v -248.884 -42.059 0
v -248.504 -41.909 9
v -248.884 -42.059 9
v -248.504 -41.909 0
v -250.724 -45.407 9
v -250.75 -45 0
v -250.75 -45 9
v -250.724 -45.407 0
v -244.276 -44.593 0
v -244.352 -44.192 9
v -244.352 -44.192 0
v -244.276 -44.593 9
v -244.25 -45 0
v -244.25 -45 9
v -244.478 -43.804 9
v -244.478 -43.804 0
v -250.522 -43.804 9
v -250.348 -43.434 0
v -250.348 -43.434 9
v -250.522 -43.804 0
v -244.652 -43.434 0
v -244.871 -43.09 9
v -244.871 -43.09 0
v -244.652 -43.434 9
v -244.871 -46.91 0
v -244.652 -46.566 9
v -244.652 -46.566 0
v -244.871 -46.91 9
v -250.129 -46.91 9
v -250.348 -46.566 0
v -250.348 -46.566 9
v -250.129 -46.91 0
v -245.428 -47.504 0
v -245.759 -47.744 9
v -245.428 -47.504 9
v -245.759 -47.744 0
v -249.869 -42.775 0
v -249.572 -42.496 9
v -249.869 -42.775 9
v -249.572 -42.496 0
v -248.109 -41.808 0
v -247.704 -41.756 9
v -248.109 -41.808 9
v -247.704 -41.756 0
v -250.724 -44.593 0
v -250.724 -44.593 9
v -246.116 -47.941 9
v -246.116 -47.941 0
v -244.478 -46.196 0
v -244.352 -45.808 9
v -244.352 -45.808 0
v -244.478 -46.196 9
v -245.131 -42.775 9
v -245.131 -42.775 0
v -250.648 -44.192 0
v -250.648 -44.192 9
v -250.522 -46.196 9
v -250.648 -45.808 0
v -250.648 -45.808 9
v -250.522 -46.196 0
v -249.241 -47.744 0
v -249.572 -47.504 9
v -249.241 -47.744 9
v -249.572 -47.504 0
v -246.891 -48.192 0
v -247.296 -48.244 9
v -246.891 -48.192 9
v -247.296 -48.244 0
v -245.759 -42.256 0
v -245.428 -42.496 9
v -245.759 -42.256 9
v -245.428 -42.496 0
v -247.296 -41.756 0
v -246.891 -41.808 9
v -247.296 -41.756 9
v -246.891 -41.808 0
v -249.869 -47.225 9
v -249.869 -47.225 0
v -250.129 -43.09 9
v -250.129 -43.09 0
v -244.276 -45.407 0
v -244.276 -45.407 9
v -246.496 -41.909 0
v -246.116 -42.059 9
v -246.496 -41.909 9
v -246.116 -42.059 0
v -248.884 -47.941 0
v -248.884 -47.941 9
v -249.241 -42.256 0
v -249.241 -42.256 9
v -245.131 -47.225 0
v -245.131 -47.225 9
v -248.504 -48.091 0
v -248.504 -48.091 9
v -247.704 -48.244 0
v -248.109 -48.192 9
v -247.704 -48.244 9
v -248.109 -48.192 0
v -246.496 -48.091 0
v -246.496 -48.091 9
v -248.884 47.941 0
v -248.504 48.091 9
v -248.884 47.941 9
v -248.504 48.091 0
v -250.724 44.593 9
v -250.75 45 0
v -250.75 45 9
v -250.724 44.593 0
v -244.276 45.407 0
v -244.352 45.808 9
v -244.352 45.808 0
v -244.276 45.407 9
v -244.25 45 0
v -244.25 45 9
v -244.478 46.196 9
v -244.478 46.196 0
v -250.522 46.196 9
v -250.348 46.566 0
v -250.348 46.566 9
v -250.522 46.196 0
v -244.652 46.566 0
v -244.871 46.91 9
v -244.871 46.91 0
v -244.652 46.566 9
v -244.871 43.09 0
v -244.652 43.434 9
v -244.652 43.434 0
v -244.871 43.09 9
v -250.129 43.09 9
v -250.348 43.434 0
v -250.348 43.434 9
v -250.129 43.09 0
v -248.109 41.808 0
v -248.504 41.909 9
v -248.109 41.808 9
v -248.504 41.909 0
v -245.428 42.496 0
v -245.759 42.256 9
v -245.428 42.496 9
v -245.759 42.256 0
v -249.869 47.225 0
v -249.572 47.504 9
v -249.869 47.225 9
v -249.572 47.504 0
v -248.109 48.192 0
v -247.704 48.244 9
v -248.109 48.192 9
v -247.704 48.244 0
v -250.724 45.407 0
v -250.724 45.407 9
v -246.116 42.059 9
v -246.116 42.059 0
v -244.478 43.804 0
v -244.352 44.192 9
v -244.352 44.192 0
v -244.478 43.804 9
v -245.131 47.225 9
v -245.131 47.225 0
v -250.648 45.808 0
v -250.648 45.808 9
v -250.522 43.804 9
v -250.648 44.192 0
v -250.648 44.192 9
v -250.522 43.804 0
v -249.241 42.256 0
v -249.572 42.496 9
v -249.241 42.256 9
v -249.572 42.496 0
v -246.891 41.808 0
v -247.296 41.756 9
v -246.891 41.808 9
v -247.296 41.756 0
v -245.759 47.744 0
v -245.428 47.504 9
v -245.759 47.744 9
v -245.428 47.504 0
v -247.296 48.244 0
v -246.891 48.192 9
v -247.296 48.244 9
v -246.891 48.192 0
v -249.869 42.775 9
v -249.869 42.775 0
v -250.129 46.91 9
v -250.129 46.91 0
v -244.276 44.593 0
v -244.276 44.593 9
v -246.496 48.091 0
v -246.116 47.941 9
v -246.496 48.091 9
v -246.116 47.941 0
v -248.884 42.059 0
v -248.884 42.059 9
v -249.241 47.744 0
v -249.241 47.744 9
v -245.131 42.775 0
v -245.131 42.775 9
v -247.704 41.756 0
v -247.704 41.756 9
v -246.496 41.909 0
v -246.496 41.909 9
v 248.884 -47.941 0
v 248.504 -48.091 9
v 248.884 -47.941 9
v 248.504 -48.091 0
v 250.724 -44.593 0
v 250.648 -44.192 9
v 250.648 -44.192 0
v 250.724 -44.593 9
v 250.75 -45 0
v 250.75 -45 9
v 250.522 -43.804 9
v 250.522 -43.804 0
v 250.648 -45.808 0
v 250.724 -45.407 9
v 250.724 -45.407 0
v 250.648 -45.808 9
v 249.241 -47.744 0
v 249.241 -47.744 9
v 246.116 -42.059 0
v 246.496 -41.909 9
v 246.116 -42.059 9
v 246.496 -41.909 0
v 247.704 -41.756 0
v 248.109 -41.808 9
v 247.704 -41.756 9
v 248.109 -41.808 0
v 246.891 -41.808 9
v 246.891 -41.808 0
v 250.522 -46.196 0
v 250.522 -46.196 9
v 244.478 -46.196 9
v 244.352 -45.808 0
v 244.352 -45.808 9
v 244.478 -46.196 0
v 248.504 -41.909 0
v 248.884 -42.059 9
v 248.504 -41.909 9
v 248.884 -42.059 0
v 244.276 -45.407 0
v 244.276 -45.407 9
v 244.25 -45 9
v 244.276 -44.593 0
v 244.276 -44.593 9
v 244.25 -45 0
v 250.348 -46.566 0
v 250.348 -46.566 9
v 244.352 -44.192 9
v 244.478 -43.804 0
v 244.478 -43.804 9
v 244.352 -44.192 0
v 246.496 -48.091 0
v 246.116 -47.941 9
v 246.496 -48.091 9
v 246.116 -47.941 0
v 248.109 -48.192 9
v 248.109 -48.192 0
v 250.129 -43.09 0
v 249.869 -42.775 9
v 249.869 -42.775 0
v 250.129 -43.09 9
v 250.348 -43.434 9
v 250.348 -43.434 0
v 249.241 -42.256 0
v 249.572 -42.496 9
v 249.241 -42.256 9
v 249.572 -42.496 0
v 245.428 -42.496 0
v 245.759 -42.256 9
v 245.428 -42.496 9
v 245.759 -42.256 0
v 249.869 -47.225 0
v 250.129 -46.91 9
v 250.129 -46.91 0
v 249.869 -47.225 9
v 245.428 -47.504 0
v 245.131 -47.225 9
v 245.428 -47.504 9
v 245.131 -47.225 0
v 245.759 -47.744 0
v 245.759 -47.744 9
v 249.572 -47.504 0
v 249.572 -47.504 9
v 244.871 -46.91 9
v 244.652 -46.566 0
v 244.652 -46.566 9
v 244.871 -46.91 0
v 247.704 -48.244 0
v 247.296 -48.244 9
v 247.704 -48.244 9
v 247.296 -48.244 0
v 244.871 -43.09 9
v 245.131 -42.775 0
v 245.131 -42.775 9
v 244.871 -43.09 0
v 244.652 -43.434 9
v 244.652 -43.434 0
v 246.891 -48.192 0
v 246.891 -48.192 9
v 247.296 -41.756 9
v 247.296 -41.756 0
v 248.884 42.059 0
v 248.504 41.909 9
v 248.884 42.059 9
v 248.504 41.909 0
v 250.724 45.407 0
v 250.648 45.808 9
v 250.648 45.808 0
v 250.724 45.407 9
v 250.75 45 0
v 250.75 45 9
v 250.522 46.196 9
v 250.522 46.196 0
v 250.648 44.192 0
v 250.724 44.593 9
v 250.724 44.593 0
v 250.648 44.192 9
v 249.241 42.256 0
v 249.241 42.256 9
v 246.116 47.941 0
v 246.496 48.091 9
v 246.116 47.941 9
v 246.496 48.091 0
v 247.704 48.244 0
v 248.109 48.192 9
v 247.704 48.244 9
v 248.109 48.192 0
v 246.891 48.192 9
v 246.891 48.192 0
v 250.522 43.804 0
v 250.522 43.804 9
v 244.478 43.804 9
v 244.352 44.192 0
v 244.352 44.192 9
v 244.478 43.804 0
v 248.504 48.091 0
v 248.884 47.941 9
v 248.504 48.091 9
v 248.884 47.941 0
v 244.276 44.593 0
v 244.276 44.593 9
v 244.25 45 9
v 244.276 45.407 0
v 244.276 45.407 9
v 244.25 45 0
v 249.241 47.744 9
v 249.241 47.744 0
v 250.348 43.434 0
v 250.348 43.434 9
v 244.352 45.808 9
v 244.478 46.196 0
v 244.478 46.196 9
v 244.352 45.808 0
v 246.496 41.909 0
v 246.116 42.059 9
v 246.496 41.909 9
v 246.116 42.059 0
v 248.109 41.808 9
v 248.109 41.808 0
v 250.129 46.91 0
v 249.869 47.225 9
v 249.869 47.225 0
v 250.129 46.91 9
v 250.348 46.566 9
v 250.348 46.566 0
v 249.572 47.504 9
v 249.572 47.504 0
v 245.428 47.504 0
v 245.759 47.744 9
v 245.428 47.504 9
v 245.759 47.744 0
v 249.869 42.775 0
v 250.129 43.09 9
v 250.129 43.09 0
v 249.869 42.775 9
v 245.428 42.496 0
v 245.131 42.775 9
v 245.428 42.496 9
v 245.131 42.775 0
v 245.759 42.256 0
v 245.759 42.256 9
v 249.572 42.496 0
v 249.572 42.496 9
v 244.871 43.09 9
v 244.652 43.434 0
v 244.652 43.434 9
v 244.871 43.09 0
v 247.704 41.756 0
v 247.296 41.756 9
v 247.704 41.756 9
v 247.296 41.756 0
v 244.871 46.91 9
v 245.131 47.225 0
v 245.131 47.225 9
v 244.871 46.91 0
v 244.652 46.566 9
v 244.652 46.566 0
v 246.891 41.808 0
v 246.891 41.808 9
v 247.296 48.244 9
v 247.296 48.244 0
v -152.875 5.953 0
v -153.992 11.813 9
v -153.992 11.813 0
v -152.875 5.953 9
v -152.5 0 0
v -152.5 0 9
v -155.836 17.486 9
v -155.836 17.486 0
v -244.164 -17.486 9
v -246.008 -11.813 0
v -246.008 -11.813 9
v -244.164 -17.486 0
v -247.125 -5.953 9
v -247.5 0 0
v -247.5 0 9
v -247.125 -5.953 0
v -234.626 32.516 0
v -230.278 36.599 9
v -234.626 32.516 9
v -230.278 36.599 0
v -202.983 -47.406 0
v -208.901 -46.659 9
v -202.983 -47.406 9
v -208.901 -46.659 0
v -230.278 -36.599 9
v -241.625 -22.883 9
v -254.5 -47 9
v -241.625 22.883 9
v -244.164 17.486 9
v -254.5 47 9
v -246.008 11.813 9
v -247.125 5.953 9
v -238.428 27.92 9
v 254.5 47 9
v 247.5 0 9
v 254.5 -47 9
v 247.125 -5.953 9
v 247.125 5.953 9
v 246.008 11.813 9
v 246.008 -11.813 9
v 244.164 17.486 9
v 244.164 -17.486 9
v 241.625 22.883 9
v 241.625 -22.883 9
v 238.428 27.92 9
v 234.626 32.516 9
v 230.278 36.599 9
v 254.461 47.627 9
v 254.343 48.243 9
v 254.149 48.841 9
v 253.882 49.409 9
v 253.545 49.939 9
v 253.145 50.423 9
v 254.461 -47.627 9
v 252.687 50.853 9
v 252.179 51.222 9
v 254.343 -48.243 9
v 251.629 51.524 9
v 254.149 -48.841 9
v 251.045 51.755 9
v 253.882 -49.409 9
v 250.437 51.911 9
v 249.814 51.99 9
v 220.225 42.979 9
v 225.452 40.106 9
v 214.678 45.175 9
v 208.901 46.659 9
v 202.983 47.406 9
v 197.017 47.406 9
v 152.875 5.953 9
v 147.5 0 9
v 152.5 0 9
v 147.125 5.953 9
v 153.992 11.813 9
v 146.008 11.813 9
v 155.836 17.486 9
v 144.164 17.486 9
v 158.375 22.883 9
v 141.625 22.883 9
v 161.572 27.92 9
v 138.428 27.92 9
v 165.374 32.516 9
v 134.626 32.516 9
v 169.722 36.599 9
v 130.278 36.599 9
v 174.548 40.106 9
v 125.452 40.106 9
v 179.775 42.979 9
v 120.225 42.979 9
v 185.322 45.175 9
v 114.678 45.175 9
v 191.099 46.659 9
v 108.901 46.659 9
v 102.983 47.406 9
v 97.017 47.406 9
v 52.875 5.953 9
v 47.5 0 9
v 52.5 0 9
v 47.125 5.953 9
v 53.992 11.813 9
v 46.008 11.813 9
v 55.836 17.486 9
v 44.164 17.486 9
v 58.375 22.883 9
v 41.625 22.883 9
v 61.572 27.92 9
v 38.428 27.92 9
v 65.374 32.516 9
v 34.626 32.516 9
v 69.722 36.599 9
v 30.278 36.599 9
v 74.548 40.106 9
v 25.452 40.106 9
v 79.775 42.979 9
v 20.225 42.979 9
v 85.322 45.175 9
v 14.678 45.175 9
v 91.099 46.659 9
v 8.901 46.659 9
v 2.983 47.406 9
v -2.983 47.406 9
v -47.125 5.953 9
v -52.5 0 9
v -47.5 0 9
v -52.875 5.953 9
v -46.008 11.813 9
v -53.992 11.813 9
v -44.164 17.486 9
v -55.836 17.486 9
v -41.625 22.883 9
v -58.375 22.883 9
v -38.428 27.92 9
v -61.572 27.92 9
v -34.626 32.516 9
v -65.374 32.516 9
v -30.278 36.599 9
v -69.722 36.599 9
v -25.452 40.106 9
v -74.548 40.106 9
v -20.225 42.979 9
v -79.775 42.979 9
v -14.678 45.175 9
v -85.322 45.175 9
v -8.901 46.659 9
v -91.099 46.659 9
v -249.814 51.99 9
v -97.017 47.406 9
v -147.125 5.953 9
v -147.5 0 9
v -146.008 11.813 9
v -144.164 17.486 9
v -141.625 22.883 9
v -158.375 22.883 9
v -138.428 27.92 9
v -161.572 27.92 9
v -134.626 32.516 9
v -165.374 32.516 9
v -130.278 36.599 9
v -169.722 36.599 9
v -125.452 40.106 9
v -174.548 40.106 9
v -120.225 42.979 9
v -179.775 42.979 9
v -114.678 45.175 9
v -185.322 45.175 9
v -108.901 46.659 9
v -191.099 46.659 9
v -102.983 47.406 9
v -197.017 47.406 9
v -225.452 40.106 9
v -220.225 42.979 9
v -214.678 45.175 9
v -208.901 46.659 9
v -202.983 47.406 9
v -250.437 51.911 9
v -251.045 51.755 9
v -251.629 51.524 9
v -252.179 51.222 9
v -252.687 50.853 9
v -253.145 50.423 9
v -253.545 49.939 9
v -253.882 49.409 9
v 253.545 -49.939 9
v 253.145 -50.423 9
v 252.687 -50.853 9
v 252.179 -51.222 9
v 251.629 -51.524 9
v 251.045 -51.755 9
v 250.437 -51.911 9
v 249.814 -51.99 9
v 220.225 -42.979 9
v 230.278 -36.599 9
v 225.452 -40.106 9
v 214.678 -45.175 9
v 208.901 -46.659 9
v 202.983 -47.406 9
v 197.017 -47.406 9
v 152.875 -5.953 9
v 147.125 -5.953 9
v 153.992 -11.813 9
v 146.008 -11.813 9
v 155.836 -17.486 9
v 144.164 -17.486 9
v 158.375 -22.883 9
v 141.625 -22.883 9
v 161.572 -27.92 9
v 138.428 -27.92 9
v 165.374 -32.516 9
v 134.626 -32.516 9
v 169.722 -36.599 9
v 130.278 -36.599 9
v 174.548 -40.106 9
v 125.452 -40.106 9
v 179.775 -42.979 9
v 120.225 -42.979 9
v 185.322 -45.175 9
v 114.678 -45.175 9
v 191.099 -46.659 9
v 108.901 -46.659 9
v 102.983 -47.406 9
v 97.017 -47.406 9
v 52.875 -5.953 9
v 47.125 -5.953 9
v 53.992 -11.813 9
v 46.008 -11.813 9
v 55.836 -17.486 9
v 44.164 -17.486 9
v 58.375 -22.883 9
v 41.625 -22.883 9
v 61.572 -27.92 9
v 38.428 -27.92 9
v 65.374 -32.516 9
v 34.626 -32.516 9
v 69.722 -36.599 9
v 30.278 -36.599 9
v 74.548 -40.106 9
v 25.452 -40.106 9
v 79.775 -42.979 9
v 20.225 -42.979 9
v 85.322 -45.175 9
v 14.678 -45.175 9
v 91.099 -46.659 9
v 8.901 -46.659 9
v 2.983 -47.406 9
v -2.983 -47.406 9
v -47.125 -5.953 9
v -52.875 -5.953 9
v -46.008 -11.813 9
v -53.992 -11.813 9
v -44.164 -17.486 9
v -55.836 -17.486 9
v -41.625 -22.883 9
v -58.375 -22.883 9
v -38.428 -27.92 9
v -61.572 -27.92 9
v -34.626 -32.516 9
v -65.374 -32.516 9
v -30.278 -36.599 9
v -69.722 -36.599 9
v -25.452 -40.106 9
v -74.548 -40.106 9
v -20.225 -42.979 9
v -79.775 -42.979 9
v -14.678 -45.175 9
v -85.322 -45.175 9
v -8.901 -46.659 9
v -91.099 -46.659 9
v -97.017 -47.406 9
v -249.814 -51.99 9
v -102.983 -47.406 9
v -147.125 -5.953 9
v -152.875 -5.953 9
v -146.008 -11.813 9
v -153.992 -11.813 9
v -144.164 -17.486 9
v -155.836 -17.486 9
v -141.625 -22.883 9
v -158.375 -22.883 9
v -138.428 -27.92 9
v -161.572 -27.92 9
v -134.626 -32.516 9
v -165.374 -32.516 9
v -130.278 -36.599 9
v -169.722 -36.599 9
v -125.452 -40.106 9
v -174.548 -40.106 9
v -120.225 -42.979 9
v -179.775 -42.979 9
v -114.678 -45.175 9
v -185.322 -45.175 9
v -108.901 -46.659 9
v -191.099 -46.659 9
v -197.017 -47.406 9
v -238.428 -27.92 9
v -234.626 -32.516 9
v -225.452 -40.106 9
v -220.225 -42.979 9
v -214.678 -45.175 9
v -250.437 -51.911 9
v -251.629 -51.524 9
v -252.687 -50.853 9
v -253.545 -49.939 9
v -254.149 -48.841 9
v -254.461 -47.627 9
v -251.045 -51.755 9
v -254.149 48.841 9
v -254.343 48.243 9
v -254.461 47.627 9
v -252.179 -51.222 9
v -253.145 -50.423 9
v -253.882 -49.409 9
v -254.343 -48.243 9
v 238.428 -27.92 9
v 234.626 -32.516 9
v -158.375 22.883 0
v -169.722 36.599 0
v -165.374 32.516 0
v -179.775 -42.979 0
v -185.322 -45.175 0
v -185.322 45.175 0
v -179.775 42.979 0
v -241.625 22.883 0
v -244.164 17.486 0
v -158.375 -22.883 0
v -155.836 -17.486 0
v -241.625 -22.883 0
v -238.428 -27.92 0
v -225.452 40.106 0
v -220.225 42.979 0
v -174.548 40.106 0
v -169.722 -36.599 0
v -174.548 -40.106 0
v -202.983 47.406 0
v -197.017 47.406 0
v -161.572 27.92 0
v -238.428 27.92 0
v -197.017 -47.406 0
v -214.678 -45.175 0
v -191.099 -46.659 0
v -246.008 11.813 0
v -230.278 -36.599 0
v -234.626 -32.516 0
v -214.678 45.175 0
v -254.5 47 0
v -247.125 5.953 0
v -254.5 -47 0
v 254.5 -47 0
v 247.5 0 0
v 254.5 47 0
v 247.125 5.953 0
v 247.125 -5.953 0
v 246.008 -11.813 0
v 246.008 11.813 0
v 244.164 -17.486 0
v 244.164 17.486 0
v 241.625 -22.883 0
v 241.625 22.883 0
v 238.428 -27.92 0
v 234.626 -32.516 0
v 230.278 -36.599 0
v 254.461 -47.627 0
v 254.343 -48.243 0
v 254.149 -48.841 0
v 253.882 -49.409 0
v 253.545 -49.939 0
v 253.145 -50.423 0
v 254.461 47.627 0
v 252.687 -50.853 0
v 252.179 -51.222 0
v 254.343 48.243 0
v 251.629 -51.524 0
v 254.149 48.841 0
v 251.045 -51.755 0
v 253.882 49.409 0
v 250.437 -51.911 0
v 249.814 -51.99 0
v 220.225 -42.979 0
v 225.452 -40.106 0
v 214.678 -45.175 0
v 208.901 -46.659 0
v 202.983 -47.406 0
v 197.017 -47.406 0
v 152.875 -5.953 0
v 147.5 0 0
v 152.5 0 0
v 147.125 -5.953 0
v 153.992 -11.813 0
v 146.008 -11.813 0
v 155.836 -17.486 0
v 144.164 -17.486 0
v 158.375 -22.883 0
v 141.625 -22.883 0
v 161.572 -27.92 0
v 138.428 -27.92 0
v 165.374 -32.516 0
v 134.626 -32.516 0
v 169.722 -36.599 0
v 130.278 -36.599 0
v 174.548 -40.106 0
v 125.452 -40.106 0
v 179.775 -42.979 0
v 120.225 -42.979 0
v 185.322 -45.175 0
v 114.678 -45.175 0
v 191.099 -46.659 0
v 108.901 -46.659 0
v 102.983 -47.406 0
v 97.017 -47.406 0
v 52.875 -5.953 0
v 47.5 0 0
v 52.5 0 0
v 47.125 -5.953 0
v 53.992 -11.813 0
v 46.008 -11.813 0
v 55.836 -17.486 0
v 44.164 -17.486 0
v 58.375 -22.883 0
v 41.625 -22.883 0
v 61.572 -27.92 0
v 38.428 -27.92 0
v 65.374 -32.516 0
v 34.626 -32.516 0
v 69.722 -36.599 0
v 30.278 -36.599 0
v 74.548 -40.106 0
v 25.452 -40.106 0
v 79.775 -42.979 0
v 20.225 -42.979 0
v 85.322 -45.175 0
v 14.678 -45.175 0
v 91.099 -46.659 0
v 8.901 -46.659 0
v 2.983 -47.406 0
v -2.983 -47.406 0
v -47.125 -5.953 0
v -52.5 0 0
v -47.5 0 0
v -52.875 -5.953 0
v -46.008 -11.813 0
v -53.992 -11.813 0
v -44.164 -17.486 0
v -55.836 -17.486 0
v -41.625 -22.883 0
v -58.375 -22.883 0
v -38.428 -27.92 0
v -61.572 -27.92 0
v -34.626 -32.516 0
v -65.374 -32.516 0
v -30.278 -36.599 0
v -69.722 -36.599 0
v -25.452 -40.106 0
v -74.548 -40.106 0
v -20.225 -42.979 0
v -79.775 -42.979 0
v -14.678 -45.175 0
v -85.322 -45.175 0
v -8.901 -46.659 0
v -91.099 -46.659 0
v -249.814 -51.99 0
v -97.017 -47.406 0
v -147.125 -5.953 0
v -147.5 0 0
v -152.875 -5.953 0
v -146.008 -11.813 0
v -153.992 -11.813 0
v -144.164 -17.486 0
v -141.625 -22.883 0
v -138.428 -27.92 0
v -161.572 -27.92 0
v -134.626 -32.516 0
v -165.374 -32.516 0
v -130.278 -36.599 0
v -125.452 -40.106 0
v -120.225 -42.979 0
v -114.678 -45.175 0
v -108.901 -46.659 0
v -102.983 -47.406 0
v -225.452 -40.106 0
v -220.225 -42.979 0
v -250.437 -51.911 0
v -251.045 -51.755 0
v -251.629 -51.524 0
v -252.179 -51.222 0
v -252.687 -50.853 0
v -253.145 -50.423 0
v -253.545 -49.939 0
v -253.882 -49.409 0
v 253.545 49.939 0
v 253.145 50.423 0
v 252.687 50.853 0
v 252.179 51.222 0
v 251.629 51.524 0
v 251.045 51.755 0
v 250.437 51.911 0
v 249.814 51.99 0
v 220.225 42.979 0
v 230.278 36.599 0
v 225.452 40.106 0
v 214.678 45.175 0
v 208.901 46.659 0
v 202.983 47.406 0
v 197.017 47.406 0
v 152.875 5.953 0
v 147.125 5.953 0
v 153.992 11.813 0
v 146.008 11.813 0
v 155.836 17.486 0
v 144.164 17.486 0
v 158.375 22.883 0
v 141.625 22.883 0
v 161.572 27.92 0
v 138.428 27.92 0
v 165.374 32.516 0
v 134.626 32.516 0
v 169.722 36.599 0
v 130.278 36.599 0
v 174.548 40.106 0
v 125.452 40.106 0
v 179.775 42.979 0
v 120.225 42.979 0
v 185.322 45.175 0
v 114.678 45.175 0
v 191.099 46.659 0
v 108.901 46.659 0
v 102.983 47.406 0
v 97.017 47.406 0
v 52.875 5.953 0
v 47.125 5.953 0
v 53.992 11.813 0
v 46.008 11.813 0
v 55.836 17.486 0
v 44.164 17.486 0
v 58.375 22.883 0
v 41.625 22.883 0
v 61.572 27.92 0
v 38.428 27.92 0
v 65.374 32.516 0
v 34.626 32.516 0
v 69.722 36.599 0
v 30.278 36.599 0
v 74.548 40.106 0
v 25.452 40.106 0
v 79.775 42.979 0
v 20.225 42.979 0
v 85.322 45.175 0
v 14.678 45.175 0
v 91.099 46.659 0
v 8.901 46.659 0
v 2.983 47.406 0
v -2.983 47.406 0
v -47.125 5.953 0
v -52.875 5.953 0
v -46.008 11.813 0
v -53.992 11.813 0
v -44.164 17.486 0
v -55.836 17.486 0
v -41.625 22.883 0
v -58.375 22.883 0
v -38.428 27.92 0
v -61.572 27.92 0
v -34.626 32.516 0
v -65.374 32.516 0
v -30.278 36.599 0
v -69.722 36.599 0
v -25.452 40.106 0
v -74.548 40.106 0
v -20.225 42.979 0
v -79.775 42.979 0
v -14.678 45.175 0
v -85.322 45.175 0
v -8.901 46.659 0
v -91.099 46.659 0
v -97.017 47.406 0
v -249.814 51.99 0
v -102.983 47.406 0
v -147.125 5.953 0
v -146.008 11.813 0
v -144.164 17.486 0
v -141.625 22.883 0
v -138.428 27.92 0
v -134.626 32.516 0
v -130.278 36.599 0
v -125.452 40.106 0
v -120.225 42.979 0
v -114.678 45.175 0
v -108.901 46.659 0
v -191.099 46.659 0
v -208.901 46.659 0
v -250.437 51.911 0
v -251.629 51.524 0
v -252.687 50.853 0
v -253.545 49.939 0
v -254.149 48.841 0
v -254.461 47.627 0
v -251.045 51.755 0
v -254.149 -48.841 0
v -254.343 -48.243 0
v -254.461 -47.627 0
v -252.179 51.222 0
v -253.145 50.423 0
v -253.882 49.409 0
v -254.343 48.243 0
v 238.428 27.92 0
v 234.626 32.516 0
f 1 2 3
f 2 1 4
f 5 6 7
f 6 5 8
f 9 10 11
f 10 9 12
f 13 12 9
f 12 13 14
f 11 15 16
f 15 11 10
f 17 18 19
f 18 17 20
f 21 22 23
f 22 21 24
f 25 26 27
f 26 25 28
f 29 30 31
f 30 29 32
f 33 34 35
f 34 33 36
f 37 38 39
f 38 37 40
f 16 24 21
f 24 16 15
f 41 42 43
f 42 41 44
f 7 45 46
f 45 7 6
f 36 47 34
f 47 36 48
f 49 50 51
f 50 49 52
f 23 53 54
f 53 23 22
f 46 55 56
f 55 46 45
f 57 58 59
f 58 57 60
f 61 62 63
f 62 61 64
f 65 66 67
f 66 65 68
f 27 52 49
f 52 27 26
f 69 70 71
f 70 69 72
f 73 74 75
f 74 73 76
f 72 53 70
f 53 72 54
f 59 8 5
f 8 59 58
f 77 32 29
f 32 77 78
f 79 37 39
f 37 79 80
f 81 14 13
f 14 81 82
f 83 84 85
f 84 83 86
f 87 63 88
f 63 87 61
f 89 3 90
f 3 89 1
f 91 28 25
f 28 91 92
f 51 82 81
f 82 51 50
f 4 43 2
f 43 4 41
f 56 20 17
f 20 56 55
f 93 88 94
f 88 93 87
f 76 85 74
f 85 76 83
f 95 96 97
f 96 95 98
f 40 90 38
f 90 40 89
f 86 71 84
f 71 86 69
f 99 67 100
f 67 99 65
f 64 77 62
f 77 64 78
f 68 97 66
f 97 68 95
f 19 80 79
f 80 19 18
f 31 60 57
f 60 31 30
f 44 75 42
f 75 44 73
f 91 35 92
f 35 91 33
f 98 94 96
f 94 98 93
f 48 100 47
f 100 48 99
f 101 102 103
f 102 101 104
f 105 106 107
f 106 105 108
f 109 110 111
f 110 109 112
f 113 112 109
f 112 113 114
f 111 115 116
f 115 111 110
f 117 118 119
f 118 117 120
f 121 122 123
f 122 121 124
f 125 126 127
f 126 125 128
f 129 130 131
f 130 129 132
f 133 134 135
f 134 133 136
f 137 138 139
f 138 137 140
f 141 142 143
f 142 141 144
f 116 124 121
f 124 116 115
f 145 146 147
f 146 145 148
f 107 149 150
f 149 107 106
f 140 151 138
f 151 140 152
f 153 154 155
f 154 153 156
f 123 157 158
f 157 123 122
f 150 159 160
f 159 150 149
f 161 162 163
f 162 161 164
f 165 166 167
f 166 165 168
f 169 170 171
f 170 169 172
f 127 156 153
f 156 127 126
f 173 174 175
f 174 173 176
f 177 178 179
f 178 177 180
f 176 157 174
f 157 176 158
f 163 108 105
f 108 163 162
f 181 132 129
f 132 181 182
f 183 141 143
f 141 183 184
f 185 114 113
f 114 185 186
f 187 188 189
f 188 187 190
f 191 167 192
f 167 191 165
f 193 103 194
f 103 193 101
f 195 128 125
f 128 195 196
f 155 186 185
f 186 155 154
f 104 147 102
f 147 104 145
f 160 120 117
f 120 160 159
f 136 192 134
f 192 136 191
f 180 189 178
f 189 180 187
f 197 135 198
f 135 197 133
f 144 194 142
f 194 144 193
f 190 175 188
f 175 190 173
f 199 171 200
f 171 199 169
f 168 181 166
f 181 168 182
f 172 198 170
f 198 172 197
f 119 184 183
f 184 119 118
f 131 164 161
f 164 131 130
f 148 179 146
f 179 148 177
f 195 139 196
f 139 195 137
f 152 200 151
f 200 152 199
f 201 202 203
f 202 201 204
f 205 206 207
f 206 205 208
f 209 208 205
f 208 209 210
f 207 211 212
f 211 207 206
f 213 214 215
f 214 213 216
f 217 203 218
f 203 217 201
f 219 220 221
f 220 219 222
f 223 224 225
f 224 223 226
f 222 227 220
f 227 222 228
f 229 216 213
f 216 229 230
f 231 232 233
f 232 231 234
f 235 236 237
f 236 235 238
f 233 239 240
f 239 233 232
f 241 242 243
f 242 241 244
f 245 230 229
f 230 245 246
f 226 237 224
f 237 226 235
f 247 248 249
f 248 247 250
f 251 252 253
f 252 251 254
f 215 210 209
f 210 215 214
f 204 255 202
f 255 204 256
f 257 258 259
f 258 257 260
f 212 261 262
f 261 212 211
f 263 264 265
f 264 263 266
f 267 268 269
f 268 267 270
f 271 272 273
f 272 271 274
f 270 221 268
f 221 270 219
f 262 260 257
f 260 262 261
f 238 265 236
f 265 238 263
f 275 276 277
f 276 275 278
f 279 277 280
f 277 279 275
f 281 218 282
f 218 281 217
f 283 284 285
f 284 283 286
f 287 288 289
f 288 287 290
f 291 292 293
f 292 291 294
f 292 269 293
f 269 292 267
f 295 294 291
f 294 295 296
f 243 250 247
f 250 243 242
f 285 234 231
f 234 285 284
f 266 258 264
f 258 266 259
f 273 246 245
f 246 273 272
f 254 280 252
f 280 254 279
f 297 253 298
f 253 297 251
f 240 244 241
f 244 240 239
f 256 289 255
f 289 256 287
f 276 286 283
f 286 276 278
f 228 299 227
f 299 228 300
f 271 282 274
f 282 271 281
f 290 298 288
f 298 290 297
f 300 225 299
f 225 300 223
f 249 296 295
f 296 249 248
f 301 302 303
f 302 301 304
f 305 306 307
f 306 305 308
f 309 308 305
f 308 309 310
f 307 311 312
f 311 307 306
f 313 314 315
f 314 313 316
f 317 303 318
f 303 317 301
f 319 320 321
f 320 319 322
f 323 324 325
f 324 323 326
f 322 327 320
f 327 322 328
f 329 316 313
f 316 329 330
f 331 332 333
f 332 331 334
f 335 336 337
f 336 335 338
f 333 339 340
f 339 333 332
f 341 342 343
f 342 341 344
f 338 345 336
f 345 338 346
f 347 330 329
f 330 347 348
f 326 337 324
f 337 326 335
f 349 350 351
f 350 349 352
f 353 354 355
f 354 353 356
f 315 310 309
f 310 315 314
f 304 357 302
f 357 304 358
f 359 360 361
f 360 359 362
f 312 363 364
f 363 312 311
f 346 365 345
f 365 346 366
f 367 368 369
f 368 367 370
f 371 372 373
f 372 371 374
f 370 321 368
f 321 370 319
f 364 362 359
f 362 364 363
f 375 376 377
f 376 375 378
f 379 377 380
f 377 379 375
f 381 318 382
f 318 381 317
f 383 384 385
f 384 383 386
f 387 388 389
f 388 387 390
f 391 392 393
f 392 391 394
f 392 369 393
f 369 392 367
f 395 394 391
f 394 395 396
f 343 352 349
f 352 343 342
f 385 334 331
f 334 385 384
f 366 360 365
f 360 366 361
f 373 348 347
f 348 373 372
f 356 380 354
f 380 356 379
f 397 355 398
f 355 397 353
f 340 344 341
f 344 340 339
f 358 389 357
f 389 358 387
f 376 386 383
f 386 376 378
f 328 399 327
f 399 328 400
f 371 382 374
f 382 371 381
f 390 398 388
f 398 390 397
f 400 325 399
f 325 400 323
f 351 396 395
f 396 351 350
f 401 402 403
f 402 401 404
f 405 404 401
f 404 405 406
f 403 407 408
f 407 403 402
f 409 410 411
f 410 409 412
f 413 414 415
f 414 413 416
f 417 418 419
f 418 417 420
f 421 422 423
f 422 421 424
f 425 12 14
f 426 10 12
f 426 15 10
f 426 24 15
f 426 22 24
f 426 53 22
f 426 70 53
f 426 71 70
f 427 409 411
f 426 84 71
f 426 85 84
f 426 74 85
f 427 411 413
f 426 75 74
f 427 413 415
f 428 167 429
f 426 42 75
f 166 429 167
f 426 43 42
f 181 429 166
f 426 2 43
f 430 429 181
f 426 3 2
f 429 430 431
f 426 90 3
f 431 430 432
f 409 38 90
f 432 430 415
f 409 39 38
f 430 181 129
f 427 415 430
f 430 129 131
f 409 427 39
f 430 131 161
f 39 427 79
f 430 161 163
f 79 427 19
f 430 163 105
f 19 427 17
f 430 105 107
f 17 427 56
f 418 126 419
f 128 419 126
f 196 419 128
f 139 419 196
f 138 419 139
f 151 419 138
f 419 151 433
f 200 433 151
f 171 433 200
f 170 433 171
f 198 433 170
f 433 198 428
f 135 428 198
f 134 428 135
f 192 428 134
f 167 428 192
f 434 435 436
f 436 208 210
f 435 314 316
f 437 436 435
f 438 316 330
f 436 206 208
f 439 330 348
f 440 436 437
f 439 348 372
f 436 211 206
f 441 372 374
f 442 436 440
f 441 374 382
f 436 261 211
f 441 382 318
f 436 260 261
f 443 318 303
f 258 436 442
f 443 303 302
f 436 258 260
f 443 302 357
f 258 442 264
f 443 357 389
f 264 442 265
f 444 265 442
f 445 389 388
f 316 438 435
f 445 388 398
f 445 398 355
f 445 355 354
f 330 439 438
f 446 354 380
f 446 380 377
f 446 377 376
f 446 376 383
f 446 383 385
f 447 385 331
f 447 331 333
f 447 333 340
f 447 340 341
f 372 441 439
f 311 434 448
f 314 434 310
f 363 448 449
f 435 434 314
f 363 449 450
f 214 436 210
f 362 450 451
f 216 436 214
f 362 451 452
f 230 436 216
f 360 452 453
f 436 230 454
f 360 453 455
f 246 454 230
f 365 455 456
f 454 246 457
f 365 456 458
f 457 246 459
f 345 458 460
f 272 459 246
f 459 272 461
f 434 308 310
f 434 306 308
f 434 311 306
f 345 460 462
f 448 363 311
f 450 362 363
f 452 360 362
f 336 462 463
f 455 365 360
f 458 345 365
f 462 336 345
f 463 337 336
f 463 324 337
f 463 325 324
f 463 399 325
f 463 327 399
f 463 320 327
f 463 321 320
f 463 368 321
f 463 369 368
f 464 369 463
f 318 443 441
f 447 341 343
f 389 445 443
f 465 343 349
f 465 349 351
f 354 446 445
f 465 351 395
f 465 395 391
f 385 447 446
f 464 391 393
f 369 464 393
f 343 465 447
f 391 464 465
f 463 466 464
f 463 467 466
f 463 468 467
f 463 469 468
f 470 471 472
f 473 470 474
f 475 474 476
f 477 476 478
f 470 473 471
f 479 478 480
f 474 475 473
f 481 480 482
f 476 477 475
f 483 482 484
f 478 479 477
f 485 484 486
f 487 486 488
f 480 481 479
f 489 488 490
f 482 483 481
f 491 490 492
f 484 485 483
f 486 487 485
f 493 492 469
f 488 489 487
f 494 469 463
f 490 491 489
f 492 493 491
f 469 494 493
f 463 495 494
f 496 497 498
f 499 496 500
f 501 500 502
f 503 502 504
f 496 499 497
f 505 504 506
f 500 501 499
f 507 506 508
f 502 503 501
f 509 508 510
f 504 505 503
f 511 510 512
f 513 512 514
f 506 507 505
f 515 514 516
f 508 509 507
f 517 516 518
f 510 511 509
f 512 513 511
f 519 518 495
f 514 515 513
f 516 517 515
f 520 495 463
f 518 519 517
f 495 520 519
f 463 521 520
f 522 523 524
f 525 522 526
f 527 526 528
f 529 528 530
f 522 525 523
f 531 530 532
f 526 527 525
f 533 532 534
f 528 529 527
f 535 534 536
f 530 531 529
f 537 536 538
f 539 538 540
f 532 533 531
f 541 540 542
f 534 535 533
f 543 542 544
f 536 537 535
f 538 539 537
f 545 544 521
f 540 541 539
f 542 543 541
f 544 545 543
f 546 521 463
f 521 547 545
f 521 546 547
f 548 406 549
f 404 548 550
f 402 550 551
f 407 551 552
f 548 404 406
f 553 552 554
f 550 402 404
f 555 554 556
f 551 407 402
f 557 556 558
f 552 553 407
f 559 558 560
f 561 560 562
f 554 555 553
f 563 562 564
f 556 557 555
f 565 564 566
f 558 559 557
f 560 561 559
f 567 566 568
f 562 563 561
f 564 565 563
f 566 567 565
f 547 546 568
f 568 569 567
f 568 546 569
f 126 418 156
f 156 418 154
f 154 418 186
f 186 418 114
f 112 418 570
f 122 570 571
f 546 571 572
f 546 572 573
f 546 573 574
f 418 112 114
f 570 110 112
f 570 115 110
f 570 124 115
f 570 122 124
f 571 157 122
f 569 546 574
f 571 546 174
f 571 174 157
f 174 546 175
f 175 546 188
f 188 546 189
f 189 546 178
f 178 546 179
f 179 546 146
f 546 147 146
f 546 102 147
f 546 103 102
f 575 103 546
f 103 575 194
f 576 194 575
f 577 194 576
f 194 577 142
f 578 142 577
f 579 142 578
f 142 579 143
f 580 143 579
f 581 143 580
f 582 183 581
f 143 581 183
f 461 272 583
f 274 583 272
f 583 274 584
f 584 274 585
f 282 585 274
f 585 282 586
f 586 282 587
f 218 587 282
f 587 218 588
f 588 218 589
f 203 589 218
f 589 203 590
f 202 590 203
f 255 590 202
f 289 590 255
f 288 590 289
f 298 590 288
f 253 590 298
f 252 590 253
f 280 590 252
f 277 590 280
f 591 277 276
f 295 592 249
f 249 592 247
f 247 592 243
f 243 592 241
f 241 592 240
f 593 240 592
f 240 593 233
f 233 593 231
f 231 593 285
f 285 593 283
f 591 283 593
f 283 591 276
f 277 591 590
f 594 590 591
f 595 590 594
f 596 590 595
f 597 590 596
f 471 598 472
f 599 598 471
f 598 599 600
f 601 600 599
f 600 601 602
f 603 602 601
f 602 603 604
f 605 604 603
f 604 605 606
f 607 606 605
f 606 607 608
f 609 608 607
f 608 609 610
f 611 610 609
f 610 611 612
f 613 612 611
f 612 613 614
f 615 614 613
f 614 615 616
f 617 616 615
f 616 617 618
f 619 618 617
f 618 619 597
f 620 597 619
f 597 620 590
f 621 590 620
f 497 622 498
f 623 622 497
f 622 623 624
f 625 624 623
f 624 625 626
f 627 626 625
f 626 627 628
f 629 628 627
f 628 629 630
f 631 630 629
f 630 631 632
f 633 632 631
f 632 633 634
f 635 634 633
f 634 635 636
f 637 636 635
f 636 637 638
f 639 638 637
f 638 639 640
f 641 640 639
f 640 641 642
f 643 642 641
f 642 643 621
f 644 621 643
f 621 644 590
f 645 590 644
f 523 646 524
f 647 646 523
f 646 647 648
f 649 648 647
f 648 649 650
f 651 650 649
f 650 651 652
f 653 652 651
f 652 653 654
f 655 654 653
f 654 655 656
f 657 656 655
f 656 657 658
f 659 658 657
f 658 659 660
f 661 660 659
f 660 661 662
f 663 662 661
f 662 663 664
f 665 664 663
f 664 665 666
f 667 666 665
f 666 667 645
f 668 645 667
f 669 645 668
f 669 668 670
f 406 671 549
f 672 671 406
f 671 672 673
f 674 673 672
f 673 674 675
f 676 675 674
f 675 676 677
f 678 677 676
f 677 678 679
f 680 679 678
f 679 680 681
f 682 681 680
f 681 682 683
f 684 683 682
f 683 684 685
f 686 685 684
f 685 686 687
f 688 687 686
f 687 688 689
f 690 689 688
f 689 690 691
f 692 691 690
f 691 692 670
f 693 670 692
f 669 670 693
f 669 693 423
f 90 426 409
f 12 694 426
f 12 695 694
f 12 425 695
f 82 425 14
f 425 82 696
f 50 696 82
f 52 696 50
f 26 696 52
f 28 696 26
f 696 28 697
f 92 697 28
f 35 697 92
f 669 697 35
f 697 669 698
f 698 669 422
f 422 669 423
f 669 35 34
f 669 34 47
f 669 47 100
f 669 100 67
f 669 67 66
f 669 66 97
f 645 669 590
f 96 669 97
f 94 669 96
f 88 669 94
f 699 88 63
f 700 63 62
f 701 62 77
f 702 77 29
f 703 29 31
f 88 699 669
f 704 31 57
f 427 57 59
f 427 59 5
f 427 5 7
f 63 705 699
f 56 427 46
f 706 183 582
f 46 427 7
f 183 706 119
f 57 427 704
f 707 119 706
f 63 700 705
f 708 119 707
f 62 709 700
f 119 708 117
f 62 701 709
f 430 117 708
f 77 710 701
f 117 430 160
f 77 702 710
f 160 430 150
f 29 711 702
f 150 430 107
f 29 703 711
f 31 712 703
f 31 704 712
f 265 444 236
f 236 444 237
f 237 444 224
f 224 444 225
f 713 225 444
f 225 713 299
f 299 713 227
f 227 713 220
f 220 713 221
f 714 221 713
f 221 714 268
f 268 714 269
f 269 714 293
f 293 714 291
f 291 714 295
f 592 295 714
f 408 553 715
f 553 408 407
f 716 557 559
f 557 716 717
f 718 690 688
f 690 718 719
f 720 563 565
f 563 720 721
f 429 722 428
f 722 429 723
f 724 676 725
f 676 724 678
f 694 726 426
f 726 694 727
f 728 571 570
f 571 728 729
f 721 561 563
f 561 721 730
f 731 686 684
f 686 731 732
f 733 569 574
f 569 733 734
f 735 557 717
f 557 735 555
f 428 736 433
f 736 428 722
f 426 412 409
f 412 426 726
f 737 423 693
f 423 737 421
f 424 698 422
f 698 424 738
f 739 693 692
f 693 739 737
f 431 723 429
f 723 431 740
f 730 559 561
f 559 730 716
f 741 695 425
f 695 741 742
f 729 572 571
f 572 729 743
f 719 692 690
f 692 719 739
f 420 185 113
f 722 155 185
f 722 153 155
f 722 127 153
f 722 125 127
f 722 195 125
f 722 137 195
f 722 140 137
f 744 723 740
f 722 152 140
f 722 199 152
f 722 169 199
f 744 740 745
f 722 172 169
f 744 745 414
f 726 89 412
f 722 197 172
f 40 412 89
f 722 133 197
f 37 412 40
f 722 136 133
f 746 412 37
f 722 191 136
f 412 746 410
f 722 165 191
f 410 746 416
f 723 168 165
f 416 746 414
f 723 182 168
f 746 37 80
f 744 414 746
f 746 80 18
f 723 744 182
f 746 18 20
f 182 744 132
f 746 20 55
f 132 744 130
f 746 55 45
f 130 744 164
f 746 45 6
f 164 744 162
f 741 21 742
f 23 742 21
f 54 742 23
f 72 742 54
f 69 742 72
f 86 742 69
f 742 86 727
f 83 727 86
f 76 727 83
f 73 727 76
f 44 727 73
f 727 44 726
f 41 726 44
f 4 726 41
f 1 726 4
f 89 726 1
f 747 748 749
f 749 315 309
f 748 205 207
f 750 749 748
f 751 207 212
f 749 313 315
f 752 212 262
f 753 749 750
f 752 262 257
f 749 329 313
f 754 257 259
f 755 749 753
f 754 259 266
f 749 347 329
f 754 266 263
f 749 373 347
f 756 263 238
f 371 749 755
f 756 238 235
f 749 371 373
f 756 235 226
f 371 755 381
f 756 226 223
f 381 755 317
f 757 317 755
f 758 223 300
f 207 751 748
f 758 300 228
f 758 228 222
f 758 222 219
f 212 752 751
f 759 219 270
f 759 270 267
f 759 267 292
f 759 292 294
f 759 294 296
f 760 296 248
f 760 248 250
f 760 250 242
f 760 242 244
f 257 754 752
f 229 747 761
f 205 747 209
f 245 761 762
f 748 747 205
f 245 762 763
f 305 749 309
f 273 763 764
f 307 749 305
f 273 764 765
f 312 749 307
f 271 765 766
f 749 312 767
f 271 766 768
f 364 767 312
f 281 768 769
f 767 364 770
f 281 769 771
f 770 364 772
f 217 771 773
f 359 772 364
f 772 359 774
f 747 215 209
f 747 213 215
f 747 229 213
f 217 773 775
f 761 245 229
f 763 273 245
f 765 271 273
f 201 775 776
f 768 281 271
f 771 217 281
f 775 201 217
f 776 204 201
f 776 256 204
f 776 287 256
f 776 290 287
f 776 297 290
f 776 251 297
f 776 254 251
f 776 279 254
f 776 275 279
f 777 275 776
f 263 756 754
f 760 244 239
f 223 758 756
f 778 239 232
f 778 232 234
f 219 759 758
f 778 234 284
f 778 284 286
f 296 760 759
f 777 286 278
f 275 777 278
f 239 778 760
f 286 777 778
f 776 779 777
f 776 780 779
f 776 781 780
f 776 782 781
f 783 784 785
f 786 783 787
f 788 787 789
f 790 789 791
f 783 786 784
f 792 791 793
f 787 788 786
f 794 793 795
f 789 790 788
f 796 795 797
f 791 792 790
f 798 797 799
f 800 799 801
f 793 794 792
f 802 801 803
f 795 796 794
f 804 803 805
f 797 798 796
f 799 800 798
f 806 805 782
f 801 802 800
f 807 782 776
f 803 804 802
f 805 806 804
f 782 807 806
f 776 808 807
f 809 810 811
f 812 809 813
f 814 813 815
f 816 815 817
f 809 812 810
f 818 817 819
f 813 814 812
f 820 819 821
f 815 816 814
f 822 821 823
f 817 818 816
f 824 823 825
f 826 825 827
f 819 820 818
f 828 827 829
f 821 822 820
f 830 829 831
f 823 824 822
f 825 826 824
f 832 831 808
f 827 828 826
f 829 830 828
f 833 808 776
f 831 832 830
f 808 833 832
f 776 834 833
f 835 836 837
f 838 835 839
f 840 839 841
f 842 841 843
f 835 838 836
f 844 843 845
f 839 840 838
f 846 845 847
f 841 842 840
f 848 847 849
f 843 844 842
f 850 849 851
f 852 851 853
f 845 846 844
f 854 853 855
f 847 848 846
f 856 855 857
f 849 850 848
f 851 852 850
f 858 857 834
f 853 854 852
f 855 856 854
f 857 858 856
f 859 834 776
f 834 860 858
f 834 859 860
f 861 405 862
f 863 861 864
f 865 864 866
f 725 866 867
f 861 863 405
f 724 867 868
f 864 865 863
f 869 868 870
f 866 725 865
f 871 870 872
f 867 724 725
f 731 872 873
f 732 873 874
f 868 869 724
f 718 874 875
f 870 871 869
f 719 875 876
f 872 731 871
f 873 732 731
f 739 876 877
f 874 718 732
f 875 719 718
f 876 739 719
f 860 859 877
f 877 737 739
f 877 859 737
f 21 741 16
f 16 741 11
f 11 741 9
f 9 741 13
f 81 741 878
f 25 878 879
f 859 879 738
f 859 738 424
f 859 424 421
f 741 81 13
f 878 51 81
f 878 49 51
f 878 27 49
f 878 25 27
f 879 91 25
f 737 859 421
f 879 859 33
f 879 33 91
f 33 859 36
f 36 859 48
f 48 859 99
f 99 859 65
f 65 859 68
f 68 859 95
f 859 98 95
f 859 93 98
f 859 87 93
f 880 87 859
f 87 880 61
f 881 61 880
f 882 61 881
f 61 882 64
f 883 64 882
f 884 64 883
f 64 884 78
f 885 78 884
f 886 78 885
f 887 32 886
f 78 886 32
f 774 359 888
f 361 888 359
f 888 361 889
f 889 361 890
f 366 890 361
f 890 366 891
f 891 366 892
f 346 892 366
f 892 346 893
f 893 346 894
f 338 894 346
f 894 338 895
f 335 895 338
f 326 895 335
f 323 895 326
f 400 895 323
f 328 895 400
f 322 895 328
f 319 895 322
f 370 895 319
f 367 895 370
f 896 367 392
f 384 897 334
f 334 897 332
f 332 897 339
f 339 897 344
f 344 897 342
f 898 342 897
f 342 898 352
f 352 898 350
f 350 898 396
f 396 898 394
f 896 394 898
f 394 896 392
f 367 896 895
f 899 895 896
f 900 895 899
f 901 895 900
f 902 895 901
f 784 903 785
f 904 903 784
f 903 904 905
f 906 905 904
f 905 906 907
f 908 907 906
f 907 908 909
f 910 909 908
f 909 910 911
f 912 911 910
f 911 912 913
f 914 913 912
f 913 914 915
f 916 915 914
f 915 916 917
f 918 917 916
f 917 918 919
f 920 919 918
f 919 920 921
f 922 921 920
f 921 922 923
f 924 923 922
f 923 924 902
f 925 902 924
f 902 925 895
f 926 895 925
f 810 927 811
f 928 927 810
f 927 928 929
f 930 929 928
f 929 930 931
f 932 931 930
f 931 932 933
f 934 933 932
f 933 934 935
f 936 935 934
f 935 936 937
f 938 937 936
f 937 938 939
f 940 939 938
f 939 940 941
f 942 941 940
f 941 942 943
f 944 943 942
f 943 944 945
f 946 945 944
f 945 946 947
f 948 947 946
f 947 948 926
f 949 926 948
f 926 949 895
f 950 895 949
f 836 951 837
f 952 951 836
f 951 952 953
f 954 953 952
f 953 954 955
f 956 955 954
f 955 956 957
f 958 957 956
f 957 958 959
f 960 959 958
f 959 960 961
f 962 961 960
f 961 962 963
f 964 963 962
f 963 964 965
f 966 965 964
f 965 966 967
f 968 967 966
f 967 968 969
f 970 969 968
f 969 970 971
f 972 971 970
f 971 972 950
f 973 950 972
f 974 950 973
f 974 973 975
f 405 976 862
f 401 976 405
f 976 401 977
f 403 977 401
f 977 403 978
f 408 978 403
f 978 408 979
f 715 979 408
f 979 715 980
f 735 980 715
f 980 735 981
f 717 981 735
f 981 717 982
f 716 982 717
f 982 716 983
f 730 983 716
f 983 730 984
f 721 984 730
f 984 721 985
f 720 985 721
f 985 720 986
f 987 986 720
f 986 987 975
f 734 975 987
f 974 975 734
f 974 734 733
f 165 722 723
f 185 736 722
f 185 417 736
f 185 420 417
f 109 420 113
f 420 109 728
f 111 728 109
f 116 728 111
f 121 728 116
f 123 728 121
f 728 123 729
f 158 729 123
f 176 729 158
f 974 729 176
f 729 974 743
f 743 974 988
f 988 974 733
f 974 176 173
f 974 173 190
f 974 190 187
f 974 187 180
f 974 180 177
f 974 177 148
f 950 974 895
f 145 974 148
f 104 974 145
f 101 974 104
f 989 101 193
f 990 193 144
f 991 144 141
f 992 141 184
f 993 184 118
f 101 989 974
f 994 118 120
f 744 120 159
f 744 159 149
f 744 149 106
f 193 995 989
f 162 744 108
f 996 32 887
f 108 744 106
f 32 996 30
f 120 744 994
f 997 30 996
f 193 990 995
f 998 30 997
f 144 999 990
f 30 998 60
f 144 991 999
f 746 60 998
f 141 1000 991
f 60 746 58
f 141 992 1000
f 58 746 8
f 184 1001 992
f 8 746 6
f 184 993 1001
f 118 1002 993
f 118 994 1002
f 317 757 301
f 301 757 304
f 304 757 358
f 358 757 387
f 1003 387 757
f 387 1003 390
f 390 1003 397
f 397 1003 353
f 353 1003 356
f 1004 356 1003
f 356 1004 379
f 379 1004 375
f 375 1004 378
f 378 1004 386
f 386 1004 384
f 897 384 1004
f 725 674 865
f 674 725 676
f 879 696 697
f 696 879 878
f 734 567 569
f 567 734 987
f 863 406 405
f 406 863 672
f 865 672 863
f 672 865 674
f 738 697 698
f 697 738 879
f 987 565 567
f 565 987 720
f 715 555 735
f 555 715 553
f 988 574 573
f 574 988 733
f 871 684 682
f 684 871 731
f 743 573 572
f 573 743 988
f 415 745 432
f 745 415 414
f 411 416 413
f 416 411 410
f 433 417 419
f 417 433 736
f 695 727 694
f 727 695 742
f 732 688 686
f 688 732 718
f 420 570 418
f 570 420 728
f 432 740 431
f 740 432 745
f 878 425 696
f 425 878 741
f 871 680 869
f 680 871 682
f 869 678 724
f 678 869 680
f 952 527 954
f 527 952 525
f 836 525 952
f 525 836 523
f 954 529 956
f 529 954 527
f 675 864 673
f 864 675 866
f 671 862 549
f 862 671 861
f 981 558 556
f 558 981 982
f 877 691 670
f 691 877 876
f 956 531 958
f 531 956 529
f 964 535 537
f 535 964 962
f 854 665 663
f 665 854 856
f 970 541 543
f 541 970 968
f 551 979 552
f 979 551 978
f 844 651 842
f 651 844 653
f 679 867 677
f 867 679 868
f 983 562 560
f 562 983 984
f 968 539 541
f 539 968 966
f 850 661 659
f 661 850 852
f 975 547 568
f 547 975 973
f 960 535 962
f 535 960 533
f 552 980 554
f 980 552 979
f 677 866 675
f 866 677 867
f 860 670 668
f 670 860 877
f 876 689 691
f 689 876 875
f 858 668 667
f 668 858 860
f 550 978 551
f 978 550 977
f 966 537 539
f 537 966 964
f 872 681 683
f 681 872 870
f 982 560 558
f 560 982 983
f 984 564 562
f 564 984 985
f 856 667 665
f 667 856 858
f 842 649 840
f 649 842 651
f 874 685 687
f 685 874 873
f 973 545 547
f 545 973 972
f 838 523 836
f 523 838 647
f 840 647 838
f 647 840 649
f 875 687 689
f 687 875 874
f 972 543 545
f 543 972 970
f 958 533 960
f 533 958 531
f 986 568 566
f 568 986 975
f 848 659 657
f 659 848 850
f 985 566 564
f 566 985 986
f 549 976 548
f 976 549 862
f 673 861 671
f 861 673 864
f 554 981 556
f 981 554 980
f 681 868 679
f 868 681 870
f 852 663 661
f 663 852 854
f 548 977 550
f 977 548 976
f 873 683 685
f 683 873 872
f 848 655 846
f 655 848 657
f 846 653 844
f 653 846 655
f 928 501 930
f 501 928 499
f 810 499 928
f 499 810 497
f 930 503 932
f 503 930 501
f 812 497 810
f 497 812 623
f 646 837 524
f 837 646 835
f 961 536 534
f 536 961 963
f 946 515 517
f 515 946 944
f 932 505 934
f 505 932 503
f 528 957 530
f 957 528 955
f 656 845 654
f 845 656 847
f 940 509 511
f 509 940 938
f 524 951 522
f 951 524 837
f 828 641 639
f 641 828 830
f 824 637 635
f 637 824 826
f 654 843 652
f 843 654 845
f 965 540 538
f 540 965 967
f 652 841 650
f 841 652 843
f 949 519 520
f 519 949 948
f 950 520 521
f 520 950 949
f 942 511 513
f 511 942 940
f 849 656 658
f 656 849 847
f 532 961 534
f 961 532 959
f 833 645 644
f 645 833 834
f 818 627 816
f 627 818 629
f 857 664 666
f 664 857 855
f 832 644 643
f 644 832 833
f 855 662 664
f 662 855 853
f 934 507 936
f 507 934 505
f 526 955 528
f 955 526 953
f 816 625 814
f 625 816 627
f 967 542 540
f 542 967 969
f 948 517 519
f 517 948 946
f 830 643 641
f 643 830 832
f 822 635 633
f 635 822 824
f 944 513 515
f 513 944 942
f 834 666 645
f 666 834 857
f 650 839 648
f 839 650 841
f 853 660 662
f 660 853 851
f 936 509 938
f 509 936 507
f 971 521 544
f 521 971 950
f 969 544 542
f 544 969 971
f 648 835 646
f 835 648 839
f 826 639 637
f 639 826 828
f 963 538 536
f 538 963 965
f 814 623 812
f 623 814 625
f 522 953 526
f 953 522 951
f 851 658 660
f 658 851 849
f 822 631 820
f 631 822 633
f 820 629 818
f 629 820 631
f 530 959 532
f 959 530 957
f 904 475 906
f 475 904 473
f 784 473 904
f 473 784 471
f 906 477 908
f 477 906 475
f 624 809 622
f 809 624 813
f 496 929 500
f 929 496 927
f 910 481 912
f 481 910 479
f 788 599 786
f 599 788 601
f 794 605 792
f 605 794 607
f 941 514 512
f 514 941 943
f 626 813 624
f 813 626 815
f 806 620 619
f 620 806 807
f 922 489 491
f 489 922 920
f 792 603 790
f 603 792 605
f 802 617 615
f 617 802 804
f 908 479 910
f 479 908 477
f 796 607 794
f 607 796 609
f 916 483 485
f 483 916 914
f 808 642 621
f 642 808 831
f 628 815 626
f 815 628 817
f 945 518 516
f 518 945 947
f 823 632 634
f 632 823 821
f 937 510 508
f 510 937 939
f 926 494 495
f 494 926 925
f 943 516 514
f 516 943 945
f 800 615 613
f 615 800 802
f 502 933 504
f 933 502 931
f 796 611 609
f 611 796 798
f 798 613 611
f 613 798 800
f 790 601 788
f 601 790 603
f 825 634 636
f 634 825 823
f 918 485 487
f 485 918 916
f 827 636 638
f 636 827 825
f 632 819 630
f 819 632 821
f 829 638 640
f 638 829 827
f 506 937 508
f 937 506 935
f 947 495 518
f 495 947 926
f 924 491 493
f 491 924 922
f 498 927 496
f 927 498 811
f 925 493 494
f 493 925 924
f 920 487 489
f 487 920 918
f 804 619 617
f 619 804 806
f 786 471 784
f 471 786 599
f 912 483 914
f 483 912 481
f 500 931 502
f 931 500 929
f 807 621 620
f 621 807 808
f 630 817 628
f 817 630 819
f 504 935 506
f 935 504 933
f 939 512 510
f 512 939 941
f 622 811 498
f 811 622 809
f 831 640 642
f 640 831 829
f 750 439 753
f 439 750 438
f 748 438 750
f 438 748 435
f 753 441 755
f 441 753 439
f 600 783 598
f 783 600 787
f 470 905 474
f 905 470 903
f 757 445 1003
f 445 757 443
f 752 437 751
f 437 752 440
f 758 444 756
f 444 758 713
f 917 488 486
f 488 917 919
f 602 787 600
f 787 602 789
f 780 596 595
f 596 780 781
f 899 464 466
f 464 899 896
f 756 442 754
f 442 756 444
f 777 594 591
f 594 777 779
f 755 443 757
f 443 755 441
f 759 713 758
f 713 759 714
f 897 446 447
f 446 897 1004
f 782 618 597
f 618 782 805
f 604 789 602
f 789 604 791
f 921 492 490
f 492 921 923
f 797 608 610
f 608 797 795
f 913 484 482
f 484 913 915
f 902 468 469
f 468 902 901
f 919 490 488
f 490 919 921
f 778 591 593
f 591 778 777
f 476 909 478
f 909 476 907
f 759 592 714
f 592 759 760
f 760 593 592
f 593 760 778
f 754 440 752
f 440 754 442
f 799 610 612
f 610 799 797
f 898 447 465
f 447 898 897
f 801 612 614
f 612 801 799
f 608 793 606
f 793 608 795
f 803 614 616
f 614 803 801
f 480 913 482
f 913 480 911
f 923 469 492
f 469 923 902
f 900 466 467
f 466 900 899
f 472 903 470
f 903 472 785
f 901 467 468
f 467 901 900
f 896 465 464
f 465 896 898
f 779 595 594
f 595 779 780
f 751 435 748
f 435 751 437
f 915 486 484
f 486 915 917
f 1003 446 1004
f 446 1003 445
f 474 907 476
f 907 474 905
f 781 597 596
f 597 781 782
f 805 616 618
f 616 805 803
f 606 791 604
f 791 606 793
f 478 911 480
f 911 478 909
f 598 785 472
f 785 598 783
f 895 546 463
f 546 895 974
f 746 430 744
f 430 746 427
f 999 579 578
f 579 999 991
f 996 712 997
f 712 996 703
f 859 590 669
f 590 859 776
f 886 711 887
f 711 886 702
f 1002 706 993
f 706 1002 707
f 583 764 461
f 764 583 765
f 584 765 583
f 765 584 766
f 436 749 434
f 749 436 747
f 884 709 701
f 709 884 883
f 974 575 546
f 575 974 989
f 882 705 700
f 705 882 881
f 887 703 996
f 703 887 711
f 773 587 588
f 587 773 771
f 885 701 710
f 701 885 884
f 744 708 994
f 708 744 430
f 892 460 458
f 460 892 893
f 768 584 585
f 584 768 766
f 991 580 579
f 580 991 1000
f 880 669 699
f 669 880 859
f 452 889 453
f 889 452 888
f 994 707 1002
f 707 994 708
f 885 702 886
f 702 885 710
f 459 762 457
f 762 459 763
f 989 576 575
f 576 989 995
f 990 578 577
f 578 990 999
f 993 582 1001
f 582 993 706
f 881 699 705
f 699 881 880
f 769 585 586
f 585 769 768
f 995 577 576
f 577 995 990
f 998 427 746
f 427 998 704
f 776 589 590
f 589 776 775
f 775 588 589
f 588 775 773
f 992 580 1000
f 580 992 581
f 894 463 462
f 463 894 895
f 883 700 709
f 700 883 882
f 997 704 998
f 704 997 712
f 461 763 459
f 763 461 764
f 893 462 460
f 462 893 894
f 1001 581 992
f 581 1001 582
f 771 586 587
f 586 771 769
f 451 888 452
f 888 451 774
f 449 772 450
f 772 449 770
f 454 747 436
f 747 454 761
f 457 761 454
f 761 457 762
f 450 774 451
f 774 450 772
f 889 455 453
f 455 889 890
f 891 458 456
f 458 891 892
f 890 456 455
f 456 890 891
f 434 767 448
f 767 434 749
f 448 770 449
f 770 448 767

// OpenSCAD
$fn = 50;


difference() {
	union() {
		hull() {
			translate(v = [-249.5000000000, 47.0000000000, 0]) {
				cylinder(h = 9, r = 5);
			}
			translate(v = [249.5000000000, 47.0000000000, 0]) {
				cylinder(h = 9, r = 5);
			}
			translate(v = [-249.5000000000, -47.0000000000, 0]) {
				cylinder(h = 9, r = 5);
			}
			translate(v = [249.5000000000, -47.0000000000, 0]) {
				cylinder(h = 9, r = 5);
			}
		}
	}
	union() {
		#translate(v = [-247.5000000000, -45.0000000000, -100.0000000000]) {
			cylinder(h = 200, r = 3.2500000000);
		}
		#translate(v = [-247.5000000000, 45.0000000000, -100.0000000000]) {
			cylinder(h = 200, r = 3.2500000000);
		}
		#translate(v = [247.5000000000, -45.0000000000, -100.0000000000]) {
			cylinder(h = 200, r = 3.2500000000);
		}
		#translate(v = [247.5000000000, 45.0000000000, -100.0000000000]) {
			cylinder(h = 200, r = 3.2500000000);
		}
		#translate(v = [-200.0000000000, 0, 0]) {
			cylinder(h = 9, r = 47.5000000000);
		}
		#translate(v = [-100.0000000000, 0, 0]) {
			cylinder(h = 9, r = 47.5000000000);
		}
		#cylinder(h = 9, r = 47.5000000000);
		#translate(v = [100.0000000000, 0, 0]) {
			cylinder(h = 9, r = 47.5000000000);
		}
		#translate(v = [200.0000000000, 0, 0]) {
			cylinder(h = 9, r = 47.5000000000);
		}
	}
}
